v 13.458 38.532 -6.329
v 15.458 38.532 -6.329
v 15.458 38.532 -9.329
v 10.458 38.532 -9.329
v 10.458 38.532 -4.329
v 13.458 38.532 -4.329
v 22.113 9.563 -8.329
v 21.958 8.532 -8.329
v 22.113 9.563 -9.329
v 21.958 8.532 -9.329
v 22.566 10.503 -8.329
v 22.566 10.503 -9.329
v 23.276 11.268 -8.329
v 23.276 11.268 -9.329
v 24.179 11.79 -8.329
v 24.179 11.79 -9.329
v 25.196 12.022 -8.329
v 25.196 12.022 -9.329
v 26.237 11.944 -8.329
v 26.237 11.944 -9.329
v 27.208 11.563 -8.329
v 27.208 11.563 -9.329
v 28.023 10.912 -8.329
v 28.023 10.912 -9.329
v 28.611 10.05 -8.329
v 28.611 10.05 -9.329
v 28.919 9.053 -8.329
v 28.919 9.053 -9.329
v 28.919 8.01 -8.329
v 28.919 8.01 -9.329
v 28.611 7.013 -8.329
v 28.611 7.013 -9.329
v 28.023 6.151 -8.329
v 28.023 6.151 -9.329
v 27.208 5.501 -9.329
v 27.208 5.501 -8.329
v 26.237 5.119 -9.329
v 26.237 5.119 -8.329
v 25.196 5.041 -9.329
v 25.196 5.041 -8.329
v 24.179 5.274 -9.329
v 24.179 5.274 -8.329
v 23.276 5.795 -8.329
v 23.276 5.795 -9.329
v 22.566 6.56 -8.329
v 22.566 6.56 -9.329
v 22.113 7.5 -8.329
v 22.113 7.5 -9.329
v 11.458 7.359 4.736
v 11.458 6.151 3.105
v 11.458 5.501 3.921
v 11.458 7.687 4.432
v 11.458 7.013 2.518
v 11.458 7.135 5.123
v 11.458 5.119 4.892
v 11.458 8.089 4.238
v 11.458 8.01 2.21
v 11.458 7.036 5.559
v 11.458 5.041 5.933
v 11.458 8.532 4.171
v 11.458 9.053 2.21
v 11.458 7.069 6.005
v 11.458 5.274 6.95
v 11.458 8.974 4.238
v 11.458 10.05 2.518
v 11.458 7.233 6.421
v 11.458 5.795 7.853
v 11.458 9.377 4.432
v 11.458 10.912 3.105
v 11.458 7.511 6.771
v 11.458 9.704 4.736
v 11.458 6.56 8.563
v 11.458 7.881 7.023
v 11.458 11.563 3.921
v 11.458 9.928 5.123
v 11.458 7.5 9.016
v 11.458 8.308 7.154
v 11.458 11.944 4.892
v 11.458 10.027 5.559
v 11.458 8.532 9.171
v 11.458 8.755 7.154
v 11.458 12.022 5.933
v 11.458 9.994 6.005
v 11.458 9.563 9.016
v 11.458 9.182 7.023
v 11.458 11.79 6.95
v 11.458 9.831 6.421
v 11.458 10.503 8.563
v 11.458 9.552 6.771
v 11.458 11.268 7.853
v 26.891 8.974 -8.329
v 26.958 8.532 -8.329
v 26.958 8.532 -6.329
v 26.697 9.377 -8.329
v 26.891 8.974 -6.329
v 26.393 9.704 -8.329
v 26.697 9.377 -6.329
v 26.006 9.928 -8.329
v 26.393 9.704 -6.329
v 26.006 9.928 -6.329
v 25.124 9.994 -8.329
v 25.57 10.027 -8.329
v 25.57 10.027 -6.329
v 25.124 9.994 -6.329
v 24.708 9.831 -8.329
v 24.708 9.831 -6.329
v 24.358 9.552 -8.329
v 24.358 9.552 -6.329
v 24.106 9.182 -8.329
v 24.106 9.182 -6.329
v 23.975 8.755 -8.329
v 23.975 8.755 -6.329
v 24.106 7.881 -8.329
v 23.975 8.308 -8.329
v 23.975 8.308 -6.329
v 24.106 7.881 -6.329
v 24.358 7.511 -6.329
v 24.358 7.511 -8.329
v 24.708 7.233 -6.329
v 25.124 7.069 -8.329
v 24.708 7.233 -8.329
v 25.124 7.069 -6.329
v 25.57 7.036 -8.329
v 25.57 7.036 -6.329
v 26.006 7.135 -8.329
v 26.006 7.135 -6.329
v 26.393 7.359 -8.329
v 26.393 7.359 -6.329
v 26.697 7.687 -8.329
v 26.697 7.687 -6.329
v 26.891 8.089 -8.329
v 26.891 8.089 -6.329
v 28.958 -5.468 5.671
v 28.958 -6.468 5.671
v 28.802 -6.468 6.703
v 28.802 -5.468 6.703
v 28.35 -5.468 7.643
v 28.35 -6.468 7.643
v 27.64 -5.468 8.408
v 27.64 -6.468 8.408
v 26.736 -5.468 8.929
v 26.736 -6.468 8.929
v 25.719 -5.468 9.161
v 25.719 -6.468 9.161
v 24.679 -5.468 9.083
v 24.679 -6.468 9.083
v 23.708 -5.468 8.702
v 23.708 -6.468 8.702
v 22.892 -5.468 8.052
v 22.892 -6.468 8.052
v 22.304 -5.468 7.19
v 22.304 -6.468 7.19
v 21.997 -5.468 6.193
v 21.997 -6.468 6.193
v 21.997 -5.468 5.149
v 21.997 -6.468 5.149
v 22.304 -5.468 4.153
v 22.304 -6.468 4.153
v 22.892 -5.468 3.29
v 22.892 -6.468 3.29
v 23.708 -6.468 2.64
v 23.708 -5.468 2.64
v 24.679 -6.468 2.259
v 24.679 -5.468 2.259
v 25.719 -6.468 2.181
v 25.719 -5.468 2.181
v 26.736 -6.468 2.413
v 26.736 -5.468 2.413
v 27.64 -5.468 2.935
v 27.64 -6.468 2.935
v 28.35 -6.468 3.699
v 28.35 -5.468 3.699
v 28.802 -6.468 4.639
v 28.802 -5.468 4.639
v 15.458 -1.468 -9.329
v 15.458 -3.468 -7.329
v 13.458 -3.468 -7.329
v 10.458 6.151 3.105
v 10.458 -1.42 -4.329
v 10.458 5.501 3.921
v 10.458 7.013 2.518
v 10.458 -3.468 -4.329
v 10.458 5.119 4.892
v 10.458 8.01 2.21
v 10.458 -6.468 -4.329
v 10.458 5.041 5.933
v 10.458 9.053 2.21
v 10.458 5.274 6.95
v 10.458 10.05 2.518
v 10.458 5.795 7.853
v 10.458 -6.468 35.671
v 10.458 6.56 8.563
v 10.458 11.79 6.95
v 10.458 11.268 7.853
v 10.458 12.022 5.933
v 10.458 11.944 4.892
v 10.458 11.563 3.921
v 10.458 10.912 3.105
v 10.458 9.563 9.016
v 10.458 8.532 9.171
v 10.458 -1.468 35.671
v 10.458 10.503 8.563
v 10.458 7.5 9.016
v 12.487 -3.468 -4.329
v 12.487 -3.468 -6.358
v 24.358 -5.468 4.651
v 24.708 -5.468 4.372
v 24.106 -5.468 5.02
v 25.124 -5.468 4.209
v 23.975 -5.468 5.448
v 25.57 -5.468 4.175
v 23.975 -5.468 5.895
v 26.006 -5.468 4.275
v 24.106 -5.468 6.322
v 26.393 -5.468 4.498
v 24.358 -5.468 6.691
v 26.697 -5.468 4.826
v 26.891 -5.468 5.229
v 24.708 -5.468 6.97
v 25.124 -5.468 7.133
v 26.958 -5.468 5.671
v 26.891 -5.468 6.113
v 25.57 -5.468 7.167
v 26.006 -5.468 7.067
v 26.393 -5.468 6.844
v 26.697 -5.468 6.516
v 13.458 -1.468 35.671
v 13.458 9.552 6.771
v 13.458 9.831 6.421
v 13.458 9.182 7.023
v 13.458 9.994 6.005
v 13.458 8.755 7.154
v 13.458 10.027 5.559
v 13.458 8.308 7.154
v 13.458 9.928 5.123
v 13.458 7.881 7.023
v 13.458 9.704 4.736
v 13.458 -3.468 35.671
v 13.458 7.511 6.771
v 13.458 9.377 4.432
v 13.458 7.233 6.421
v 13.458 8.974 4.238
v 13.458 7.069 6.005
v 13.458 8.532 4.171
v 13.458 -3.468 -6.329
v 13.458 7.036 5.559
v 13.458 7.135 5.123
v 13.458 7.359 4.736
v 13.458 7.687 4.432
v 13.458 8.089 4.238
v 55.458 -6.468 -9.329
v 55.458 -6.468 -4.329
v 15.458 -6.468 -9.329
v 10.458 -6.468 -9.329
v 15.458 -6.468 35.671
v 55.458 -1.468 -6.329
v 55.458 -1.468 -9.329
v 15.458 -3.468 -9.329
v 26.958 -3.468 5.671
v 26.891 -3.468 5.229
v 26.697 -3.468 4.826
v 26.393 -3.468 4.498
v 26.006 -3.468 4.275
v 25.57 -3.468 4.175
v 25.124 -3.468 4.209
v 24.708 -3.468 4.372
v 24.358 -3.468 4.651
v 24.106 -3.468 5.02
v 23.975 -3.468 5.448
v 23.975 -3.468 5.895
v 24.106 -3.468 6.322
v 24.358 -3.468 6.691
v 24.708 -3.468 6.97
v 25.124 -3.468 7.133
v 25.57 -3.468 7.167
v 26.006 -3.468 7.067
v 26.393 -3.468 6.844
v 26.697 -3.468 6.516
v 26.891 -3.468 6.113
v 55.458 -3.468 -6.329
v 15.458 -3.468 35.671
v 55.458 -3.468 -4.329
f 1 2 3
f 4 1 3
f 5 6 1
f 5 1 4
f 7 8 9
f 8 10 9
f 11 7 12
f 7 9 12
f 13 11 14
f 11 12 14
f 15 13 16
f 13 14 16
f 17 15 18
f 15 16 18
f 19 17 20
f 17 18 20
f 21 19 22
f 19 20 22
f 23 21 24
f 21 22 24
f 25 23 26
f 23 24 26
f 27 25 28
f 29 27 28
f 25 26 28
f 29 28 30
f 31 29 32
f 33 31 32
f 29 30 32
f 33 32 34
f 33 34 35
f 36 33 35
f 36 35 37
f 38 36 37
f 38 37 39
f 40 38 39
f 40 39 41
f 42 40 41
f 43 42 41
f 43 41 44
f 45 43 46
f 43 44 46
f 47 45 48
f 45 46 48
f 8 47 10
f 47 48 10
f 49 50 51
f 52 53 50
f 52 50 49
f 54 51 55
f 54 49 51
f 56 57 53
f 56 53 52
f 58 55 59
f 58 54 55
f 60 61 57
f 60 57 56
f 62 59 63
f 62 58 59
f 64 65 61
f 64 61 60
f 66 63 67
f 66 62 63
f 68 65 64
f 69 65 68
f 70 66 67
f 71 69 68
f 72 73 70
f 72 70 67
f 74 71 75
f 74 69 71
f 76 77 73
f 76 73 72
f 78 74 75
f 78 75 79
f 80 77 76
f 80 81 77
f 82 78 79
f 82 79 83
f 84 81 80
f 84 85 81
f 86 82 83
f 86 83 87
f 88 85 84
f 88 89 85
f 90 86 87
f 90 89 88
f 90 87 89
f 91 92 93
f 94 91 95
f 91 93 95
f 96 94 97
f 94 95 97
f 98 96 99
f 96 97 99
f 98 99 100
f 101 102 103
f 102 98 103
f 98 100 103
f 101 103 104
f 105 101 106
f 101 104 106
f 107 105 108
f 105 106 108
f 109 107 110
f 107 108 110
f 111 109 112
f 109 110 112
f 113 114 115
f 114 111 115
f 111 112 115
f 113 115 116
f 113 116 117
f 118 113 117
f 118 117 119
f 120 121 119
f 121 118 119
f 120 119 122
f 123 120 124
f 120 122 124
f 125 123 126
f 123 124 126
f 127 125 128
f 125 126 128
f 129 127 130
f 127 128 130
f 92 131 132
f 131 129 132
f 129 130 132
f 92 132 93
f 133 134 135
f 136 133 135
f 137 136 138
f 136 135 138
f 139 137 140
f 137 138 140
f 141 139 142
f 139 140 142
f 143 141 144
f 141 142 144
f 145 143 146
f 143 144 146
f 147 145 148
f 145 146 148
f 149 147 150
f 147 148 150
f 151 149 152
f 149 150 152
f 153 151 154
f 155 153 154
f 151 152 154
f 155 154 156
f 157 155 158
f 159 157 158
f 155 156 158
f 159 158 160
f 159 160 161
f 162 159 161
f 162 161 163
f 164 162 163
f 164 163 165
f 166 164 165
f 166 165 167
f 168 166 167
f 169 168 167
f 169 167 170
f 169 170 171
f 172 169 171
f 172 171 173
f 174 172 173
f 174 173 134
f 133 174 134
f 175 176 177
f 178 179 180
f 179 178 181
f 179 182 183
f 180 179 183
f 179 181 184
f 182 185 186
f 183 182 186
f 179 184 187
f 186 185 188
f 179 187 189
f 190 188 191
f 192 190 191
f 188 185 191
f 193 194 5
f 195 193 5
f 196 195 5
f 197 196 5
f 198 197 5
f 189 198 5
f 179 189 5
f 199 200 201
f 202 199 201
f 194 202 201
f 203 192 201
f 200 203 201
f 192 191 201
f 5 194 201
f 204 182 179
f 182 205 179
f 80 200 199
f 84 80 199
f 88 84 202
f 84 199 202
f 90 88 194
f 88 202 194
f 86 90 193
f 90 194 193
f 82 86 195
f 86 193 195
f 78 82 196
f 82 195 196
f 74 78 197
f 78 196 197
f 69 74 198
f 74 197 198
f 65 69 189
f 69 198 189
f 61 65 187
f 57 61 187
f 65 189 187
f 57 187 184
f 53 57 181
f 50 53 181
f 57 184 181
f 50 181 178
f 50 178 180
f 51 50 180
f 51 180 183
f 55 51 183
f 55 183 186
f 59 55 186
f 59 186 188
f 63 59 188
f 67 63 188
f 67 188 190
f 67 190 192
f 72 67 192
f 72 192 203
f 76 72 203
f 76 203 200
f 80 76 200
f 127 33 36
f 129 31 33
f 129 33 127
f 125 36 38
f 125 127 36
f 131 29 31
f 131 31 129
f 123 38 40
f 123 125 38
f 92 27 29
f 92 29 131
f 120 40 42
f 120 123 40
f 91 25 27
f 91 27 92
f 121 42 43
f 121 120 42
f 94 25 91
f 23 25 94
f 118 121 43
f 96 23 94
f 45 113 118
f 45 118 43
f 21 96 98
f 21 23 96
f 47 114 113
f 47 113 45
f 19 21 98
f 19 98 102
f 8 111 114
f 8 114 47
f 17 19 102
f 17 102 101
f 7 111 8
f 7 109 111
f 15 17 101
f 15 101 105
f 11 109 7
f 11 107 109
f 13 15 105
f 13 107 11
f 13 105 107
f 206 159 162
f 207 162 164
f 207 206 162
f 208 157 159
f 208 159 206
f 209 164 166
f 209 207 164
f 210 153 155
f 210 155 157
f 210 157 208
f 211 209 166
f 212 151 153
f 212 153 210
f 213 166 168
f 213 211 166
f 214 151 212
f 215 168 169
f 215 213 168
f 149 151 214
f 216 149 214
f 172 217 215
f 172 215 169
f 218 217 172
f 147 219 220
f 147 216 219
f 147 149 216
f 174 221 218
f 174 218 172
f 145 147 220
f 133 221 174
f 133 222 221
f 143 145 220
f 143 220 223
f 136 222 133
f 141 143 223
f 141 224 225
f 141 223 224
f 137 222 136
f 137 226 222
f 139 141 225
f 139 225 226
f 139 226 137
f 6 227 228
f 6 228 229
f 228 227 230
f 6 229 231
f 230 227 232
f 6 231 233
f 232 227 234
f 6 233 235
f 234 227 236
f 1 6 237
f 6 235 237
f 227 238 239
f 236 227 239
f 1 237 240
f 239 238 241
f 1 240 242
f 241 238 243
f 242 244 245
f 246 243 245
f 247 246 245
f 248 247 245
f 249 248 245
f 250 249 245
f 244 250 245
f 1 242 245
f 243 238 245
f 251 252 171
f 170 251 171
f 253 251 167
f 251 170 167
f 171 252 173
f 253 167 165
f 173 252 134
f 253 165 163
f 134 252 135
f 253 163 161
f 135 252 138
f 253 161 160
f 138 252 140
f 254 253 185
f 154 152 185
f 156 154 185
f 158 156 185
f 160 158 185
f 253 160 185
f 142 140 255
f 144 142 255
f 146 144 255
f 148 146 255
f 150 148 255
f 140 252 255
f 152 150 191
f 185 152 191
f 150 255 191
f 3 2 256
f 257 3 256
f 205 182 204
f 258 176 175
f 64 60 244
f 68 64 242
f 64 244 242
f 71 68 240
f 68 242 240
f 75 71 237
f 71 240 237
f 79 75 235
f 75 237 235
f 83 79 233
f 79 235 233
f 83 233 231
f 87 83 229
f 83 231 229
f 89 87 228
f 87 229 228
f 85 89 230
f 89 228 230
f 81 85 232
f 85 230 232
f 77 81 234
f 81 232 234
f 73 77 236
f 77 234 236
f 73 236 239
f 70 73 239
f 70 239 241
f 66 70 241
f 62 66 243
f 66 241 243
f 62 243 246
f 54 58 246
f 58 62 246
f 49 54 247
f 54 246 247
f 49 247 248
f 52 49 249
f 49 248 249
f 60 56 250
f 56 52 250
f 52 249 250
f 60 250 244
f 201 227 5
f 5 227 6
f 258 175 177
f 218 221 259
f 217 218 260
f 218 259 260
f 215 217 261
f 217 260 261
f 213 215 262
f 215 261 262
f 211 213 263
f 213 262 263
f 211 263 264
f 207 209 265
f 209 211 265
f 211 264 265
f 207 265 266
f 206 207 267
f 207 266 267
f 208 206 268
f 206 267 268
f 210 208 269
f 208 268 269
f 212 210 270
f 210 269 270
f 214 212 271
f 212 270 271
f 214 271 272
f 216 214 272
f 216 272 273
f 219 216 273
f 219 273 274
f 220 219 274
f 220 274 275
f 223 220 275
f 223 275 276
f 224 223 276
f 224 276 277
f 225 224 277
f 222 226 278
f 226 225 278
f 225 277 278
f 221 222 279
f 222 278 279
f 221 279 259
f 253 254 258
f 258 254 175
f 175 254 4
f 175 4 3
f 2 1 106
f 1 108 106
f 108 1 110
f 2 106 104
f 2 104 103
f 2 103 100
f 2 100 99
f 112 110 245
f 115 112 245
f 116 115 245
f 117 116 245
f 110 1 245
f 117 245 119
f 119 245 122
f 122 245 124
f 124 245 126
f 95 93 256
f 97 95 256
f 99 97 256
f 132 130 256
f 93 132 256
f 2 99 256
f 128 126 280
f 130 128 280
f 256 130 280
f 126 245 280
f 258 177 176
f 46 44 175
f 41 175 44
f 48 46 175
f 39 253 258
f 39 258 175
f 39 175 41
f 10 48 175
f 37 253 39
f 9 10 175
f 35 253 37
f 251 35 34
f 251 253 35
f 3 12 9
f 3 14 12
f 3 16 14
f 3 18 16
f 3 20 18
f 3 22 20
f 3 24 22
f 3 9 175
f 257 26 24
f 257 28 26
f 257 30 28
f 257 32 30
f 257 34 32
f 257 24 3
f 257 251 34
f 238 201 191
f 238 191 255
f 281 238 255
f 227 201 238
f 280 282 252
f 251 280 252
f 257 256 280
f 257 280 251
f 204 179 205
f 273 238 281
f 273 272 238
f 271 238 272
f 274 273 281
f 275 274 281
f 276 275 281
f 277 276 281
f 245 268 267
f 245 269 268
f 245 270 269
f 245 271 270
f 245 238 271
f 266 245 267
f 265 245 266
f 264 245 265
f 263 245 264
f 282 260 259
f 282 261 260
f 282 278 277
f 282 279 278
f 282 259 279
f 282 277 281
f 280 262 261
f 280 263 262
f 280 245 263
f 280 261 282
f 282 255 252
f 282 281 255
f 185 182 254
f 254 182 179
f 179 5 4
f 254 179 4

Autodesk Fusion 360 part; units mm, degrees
sketch "Sketch1" plane through (0, 0, 0) normal (0, 1, 0) x (1, 0, 0) in component "Component"
  line L0 (0, 0) -> (40, 0)
  line L1 (40, 0) -> (40, -40)
  line L2 (40, -40) -> (0, -40)
  line L3 (0, -40) -> (0, 0)
  line L4 (0, -40) -> (40, 0)
  dimension "d1" = 40
sketch "Sketch2" plane through (0, 0, 0) normal (0, 0, 1) x (1, 0, 0) in component "Component"
  line L0 (0, 0) -> (40, 0)
  line L1 (40, 0) -> (40, 40)
  line L2 (40, 40) -> (0, 40)
  line L3 (0, 40) -> (0, 0)
  line L4 (0, 40) -> (40, 0)
  circle A0 centre (10, 10) radius 1.5
  dimension "d4" = 3
sketch "Sketch3" plane through (0, 0, 0) normal (1, 0, 0) x (0, 0, -1) in component "Component"
  line L0 (0, 0) -> (-40, 0)
  line L1 (-40, 0) -> (-40, 40)
  line L2 (-40, 40) -> (0, 40)
  line L3 (0, 40) -> (0, 0)
sketch "Sketch4" plane through (0, 0, 0) normal (1, 0, 0) x (0, 0, -1) in component "Component"
  line L0 (-40, 0) -> (0, 0)
  line L1 (0, 0) -> (0, 40)
  line L2 (0, 40) -> (-40, 40)
  line L3 (-40, 40) -> (-40, 0)
  line L4 (-40, 0) -> (0, 40)
  point P0 (-40, 0)
  point P1 (0, 40)
sketch "Sketch5" plane through (0, 0, 0) normal (1, 0, 0) x (0, 0, -1) in component "Component"
  line L0 (0, 40) -> (0, 0)
  circle A0 centre (-10, 10) radius 1.5
  point P0 (-40, 40)
  dimension "d3" = 3
sketch "Sketch6" plane through (0, 0, 0) normal (0, 1, 0) x (1, 0, 0) in component "Component"
  line L0 (0, 0) -> (40, -40)
  line L1 (0, 0) -> (0, -40)
  circle A0 centre (10, -10) radius 1.5
  point P0 (40, -40)
  dimension "d2" = 3
extrude "Extrude1" add sketch "Sketch3" against normal blind 5 makes body 1 in component "Component"
extrude "Extrude2" add sketch "Sketch2" against normal blind 5 separate body contours L0 L3 L4 makes body 2 in component "Component"
extrude "Extrude3" cut sketch "Sketch4" against normal blind 12 contours L2 L3 L4 bodies 1 in component "Component"
extrude "Extrude4" cut sketch "Sketch5" against normal blind 9 bodies 1 in component "Component"
extrude "Extrude5" add sketch "Sketch1" against normal blind 5 separate body contours L0 L3 L4 makes body 3 in component "Component"
extrude "Extrude6" cut sketch "Sketch6" against normal blind 31 bodies 3 in component "Component"
sketch "Sketch7" plane through (0, 0, 0) normal (0, 0, -1) x (-1, 0, 0) in component "Component"
  line L0 (0, 0) -> (-40, 0)
  line L1 (-40, 0) -> (-40, -5)
  line L2 (-40, -5) -> (0, -5)
  line L3 (0, -5) -> (0, 0)
  line L4 (0, -5) -> (5, 0)
  line L5 (5, 0) -> (0, 0)
  line L6 (0, -5) -> (0, 0)
  line L7 (5, 0) -> (0, 0)
extrude "Extrude7" add sketch "Sketch7" against normal blind 40 contours L3 L4 L5 L6 L7 bodies 1 2 3 in component "Component"
sketch "Sketch8" plane through (0, 0, 0) normal (0, -1, 0) x (1, 0, 0) in component "Component"
  line L0 (40, 0) -> (0, 0)
  line L1 (0, 0) -> (0, -5)
  line L2 (0, -5) -> (40, -5)
  line L3 (40, -5) -> (40, 0)
  line L4 (-5, 0) -> (0, -5)
  line L5 (0, 0) -> (-5, 0)
  line L6 (0, -5) -> (0, 0)
  point P0 (-5, 0)
  point P1 (-5, 0)
extrude "Extrude8" add sketch "Sketch8" against normal blind 40 separate body contours L1 L4 L5 L6 makes body 4 in component "Component"
sketch "Sketch9" plane through (0, 0, 0) normal (1, 0, 0) x (0, 0, -1) in component "Component"
  line L0 (0, 0) -> (0, -5)
  line L1 (0, 0) -> (0, -5)
  line L2 (5, 0) -> (0, 0)
  line L3 (0, -5) -> (5, 0)
  point P0 (0, -5)
  point P1 (5, 0)
extrude "Extrude9" add sketch "Sketch9" along normal blind 40 separate body makes body 5 in component "Component"
move_face "OffsetFaces1" offset 5 1 faces at (-1.6667, 0, -1.6667) on bodies 4 in component "Component"
sketch "Sketch10" plane through (0, 0, 0) normal (0, 0, 1) x (1, 0, 0) in component "Component"
  line L0 (-5, -5) -> (0, -5)
  line L1 (0, -5) -> (0, 40)
  line L2 (0, 40) -> (-5, 40)
  line L3 (-5, 40) -> (-5, -5)
  line L4 (-5, 0.0489) -> (0, -5)
  line L5 (-5, -5) -> (-5, 0.0489)
extrude "Extrude10" cut sketch "Sketch10" against normal blind 17 contours L0 L3 L4 L5 bodies 4 in component "Component"
sketch "Sketch11" plane through (0, 0, 0) normal (1, 0, 0) x (0, 0, -1) in component "Component"
  line L0 (0, -5) -> (5, -5)
  line L1 (5, -5) -> (5, 40)
  line L2 (5, 40) -> (0, 40)
  line L3 (0, 40) -> (0, -5)
  line L4 (0, -5) -> (5, 0)
  line L5 (5, -5) -> (0, -5)
  line L6 (5, 0) -> (5, -5)
  point P0 (5, 0)
extrude "Extrude11" cut sketch "Sketch11" against normal blind 18 contours L0 L1 L4 L5 L6 bodies 4 in component "Component"
sketch "Sketch12" plane through (0, 0, 0) normal (0, 1, 0) x (1, 0, 0) in component "Component"
  line L0 (47, 2) -> (47, -47)
  line L1 (47, -47) -> (-2, -47)
  line L2 (-2, -47) -> (-2, 2)
  line L3 (-2, 2) -> (47, 2)
extrude "Extrude12" cut sketch "Sketch12" along normal blind 65 bodies 1 4 makes body 6 at (17.0332, 0, 17.0068) in component "Component"
extrude "Extrude13" cut sketch "Sketch12" against normal blind 2 bodies 4 5 6 in component "Component"
sketch "Sketch13" plane through (0, 0, -5) normal (0, 0, -1) x (-1, 0, 0) in component "Component"
  circle A0 centre (-10, 10) radius 1.5
  line L0 (-40, 0) -> (0, 0)
  line L1 (0, 0) -> (0, 40)
  line L2 (0, 40) -> (-40, 0)
  circle A1 centre (-10, 10) radius 3.5
  dimension "d33" = 7
extrude "Extrude14" cut sketch "Sketch13" against normal blind 1 contours A1 bodies 1 in component "Component"
sketch "Sketch14" plane through (-5, 0, 0) normal (-1, 0, 0) x (0, 0, 1) in component "Component"
  circle A0 centre (10, 10) radius 1.5
  line L0 (40, 0) -> (0, 40)
  line L1 (0, 40) -> (0, 0)
  line L2 (0, 0) -> (40, 0)
  circle A1 centre (10, 10) radius 3.5
  dimension "d36" = 7
extrude "Extrude15" cut sketch "Sketch14" against normal blind 1 contours A1 bodies 6 in component "Component"
sketch "Sketch15" plane through (0, -5, 0) normal (0, -1, 0) x (1, 0, 0) in component "Component"
  circle A0 centre (10, 10) radius 1.5
  line L0 (0, 40) -> (0, 0)
  line L1 (0, 0) -> (40, 0)
  line L2 (40, 0) -> (0, 40)
  circle A1 centre (10, 10) radius 3.5
  dimension "d39" = 7
extrude "Extrude16" cut sketch "Sketch15" against normal blind 1 contours A1 bodies 6 in component "Component"
sketch "Sketch16" plane through (40, 0, 0) normal (1, 0, 0) x (0, 0, -1) in component "Component"
  line L0 (2, 0) -> (2, -2)
  line L1 (2, -2) -> (0, -2)
  line L2 (0, -2) -> (0, -5)
  line L3 (0, -5) -> (5, 0)
  line L4 (5, 0) -> (2, 0)
  line L5 (0, -5) -> (5, -5)
  line L6 (5, -5) -> (5, 0)
extrude "Extrude17" add sketch "Sketch16" against normal blind 40 contours L3 L5 L6 bodies 5 1 4 6 in component "Component"
sketch "Sketch17" plane through (0, 0, 40) normal (0, 0, 1) x (1, 0, 0) in component "Component"
  line L0 (0, -2) -> (-2, -2)
  line L1 (-2, -2) -> (-2, 0)
  line L2 (-2, 0) -> (-5, 0)
  line L3 (-5, 0) -> (0, -5)
  line L4 (0, -5) -> (0, -2)
  line L5 (-5, 0) -> (0, -5)
  line L6 (-5, -5) -> (-5, 0)
  line L7 (0, -5) -> (-5, -5)
extrude "Extrude18" add sketch "Sketch17" against normal blind 40 contours L3 L5 L6 L7 bodies 5 in component "Component"
sketch "Sketch18" plane through (0, 40, 0) normal (0, 1, 0) x (-1, 0, 0) in component "Component"
  line L0 (2, -2) -> (0, -2)
  line L1 (0, -2) -> (0, -5)
  line L2 (0, -5) -> (5, 0)
  line L3 (5, 0) -> (2, 0)
  line L4 (2, 0) -> (2, -2)
  line L5 (5, 0) -> (5, -5)
  line L6 (5, -5) -> (0, -5)
  line L7 (5, 0) -> (0, -5)
extrude "Extrude19" add sketch "Sketch18" against normal blind 45 separate body contours L2 L5 L6 L7 makes body 7 in component "Component"
sketch "Sketch19" plane through (0, -5, 0) normal (0, -1, 0) x (1, 0, 0) in component "Component"
  line L0 (-5, 0) -> (-5, -5)
  line L1 (-5, -5) -> (0, -5)
  line L2 (0, -5) -> (-5, 0)
  line L3 (-5, 0) -> (0, 0)
  line L4 (0, 0) -> (0, -5)
  line L5 (0, -5) -> (-5, -5)
  line L6 (-5, -5) -> (-5, 0)
extrude "Extrude20" add sketch "Sketch19" against normal blind 3 contours L2 L3 L4 bodies 5 7 in component "Component"
component "Component" placed x (1, 0, 0) y (0, 1, 0) z (0, 0, 1) at (15.4578, -1.4684, -4.3289)
